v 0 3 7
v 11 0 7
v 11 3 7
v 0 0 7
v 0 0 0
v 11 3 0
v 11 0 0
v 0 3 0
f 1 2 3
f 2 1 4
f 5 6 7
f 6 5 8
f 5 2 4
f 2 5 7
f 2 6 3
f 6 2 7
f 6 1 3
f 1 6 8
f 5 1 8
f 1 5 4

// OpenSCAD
// Generated by SolidPython 1.0.1 on 2020-07-29 00:46:55


cube(size = [11, 3, 7]);
/***********************************************
*********      SolidPython code:      **********
************************************************
 
# import packages: SolidPython
from solid import *
from solid.utils import *
from itertools import chain, combinations, permutations


class Resize:

    def __init__(self, scad_file):
        self.scad_file = scad_file
        #self.scad_file = import_scad(scad_file)
        # cone/cylinder param:
        self.r1 = 0
        self.r2 = 0
        self.h = 0
        # rectangular prism param:
        self.w = 0
        self.l = 0
        # ellipse param:
        self.r = 0

    # import OpenScad code (file name corresponds to shape)


    # classify shape + parameters
    def assign(self, param1, param2, param3):
        if self.scad_file == 'cone.scad':
            self.r1 = param1
            self.r2 = param2
            self.h = param3
        elif self.scad_file == 'cylinder.scad':
            self.r1 = param1
            self.r2 = param2
            self.h = param3
        elif self.scad_file == 'rectangularPrism.scad':
            self.h = param1
            self.l = param2
            self.w = param3
        else:
            self.r = param1
            self.h = param2

    # resize parameters
    def iterate(self):
        x = range(3, 20, 2)
        i = 1
        if self.scad_file == 'cone.scad':
            tempList = list(permutations(x, 2))
            for temp in tempList:
                param1 = temp[0]
                param2 = temp[1]
                filepath = 'produced_scad_files/' + 'cone' + str(param1) + '_' + str(param2) + '_' + '.scad'
                scad_render_to_file(cylinder(h=param1, r1=param2, r2=0), filepath)

        elif self.scad_file == 'cylinder.scad':
            tempList = list(permutations(x, 3))
            for temp in tempList:
                param1 = temp[0]
                param2 = temp[1]
                filepath = 'produced_scad_files/' + 'cylinder' + str(param1) + '_' + str(param2) + '_' + '.scad'
                scad_render_to_file(cylinder(h=param1, r1=param2, r2=param2), filepath)

        elif self.scad_file == 'rectangularPrism.scad':
            tempList = list(permutations(x, 3))
            for temp in tempList:
                param1 = temp[0]
                param2 = temp[1]
                param3 = temp[2]
                filepath = 'produced_scad_files/' + 'rectangularPrism' + str(param1) + '_' + str(param2) + '_' + str(
                    param3) + '.scad'
                scad_render_to_file(cube(size=(param1, param2, param3)), filepath)

        elif self.scad_file == 'ellipse.scad':
            tempList = list(permutations(x, 4))
            for temp in tempList:
                param1 = temp[0]
                param2 = temp[1]
                param3 = temp[2]
                param4 = temp[3]
                filepath = 'produced_scad_files/' + 'ellipse' + str(param1) + '_' + str(param2) + '_' + str(param3) + '_' + str(param4) + '.scad'
                scad_render_to_file(scale([param1, param2, param3])(sphere(r=param4)), filepath)

    def render_to_scadfile(self):
        scad_render_to_file(scad, 'example.scad') 
 
************************************************/
